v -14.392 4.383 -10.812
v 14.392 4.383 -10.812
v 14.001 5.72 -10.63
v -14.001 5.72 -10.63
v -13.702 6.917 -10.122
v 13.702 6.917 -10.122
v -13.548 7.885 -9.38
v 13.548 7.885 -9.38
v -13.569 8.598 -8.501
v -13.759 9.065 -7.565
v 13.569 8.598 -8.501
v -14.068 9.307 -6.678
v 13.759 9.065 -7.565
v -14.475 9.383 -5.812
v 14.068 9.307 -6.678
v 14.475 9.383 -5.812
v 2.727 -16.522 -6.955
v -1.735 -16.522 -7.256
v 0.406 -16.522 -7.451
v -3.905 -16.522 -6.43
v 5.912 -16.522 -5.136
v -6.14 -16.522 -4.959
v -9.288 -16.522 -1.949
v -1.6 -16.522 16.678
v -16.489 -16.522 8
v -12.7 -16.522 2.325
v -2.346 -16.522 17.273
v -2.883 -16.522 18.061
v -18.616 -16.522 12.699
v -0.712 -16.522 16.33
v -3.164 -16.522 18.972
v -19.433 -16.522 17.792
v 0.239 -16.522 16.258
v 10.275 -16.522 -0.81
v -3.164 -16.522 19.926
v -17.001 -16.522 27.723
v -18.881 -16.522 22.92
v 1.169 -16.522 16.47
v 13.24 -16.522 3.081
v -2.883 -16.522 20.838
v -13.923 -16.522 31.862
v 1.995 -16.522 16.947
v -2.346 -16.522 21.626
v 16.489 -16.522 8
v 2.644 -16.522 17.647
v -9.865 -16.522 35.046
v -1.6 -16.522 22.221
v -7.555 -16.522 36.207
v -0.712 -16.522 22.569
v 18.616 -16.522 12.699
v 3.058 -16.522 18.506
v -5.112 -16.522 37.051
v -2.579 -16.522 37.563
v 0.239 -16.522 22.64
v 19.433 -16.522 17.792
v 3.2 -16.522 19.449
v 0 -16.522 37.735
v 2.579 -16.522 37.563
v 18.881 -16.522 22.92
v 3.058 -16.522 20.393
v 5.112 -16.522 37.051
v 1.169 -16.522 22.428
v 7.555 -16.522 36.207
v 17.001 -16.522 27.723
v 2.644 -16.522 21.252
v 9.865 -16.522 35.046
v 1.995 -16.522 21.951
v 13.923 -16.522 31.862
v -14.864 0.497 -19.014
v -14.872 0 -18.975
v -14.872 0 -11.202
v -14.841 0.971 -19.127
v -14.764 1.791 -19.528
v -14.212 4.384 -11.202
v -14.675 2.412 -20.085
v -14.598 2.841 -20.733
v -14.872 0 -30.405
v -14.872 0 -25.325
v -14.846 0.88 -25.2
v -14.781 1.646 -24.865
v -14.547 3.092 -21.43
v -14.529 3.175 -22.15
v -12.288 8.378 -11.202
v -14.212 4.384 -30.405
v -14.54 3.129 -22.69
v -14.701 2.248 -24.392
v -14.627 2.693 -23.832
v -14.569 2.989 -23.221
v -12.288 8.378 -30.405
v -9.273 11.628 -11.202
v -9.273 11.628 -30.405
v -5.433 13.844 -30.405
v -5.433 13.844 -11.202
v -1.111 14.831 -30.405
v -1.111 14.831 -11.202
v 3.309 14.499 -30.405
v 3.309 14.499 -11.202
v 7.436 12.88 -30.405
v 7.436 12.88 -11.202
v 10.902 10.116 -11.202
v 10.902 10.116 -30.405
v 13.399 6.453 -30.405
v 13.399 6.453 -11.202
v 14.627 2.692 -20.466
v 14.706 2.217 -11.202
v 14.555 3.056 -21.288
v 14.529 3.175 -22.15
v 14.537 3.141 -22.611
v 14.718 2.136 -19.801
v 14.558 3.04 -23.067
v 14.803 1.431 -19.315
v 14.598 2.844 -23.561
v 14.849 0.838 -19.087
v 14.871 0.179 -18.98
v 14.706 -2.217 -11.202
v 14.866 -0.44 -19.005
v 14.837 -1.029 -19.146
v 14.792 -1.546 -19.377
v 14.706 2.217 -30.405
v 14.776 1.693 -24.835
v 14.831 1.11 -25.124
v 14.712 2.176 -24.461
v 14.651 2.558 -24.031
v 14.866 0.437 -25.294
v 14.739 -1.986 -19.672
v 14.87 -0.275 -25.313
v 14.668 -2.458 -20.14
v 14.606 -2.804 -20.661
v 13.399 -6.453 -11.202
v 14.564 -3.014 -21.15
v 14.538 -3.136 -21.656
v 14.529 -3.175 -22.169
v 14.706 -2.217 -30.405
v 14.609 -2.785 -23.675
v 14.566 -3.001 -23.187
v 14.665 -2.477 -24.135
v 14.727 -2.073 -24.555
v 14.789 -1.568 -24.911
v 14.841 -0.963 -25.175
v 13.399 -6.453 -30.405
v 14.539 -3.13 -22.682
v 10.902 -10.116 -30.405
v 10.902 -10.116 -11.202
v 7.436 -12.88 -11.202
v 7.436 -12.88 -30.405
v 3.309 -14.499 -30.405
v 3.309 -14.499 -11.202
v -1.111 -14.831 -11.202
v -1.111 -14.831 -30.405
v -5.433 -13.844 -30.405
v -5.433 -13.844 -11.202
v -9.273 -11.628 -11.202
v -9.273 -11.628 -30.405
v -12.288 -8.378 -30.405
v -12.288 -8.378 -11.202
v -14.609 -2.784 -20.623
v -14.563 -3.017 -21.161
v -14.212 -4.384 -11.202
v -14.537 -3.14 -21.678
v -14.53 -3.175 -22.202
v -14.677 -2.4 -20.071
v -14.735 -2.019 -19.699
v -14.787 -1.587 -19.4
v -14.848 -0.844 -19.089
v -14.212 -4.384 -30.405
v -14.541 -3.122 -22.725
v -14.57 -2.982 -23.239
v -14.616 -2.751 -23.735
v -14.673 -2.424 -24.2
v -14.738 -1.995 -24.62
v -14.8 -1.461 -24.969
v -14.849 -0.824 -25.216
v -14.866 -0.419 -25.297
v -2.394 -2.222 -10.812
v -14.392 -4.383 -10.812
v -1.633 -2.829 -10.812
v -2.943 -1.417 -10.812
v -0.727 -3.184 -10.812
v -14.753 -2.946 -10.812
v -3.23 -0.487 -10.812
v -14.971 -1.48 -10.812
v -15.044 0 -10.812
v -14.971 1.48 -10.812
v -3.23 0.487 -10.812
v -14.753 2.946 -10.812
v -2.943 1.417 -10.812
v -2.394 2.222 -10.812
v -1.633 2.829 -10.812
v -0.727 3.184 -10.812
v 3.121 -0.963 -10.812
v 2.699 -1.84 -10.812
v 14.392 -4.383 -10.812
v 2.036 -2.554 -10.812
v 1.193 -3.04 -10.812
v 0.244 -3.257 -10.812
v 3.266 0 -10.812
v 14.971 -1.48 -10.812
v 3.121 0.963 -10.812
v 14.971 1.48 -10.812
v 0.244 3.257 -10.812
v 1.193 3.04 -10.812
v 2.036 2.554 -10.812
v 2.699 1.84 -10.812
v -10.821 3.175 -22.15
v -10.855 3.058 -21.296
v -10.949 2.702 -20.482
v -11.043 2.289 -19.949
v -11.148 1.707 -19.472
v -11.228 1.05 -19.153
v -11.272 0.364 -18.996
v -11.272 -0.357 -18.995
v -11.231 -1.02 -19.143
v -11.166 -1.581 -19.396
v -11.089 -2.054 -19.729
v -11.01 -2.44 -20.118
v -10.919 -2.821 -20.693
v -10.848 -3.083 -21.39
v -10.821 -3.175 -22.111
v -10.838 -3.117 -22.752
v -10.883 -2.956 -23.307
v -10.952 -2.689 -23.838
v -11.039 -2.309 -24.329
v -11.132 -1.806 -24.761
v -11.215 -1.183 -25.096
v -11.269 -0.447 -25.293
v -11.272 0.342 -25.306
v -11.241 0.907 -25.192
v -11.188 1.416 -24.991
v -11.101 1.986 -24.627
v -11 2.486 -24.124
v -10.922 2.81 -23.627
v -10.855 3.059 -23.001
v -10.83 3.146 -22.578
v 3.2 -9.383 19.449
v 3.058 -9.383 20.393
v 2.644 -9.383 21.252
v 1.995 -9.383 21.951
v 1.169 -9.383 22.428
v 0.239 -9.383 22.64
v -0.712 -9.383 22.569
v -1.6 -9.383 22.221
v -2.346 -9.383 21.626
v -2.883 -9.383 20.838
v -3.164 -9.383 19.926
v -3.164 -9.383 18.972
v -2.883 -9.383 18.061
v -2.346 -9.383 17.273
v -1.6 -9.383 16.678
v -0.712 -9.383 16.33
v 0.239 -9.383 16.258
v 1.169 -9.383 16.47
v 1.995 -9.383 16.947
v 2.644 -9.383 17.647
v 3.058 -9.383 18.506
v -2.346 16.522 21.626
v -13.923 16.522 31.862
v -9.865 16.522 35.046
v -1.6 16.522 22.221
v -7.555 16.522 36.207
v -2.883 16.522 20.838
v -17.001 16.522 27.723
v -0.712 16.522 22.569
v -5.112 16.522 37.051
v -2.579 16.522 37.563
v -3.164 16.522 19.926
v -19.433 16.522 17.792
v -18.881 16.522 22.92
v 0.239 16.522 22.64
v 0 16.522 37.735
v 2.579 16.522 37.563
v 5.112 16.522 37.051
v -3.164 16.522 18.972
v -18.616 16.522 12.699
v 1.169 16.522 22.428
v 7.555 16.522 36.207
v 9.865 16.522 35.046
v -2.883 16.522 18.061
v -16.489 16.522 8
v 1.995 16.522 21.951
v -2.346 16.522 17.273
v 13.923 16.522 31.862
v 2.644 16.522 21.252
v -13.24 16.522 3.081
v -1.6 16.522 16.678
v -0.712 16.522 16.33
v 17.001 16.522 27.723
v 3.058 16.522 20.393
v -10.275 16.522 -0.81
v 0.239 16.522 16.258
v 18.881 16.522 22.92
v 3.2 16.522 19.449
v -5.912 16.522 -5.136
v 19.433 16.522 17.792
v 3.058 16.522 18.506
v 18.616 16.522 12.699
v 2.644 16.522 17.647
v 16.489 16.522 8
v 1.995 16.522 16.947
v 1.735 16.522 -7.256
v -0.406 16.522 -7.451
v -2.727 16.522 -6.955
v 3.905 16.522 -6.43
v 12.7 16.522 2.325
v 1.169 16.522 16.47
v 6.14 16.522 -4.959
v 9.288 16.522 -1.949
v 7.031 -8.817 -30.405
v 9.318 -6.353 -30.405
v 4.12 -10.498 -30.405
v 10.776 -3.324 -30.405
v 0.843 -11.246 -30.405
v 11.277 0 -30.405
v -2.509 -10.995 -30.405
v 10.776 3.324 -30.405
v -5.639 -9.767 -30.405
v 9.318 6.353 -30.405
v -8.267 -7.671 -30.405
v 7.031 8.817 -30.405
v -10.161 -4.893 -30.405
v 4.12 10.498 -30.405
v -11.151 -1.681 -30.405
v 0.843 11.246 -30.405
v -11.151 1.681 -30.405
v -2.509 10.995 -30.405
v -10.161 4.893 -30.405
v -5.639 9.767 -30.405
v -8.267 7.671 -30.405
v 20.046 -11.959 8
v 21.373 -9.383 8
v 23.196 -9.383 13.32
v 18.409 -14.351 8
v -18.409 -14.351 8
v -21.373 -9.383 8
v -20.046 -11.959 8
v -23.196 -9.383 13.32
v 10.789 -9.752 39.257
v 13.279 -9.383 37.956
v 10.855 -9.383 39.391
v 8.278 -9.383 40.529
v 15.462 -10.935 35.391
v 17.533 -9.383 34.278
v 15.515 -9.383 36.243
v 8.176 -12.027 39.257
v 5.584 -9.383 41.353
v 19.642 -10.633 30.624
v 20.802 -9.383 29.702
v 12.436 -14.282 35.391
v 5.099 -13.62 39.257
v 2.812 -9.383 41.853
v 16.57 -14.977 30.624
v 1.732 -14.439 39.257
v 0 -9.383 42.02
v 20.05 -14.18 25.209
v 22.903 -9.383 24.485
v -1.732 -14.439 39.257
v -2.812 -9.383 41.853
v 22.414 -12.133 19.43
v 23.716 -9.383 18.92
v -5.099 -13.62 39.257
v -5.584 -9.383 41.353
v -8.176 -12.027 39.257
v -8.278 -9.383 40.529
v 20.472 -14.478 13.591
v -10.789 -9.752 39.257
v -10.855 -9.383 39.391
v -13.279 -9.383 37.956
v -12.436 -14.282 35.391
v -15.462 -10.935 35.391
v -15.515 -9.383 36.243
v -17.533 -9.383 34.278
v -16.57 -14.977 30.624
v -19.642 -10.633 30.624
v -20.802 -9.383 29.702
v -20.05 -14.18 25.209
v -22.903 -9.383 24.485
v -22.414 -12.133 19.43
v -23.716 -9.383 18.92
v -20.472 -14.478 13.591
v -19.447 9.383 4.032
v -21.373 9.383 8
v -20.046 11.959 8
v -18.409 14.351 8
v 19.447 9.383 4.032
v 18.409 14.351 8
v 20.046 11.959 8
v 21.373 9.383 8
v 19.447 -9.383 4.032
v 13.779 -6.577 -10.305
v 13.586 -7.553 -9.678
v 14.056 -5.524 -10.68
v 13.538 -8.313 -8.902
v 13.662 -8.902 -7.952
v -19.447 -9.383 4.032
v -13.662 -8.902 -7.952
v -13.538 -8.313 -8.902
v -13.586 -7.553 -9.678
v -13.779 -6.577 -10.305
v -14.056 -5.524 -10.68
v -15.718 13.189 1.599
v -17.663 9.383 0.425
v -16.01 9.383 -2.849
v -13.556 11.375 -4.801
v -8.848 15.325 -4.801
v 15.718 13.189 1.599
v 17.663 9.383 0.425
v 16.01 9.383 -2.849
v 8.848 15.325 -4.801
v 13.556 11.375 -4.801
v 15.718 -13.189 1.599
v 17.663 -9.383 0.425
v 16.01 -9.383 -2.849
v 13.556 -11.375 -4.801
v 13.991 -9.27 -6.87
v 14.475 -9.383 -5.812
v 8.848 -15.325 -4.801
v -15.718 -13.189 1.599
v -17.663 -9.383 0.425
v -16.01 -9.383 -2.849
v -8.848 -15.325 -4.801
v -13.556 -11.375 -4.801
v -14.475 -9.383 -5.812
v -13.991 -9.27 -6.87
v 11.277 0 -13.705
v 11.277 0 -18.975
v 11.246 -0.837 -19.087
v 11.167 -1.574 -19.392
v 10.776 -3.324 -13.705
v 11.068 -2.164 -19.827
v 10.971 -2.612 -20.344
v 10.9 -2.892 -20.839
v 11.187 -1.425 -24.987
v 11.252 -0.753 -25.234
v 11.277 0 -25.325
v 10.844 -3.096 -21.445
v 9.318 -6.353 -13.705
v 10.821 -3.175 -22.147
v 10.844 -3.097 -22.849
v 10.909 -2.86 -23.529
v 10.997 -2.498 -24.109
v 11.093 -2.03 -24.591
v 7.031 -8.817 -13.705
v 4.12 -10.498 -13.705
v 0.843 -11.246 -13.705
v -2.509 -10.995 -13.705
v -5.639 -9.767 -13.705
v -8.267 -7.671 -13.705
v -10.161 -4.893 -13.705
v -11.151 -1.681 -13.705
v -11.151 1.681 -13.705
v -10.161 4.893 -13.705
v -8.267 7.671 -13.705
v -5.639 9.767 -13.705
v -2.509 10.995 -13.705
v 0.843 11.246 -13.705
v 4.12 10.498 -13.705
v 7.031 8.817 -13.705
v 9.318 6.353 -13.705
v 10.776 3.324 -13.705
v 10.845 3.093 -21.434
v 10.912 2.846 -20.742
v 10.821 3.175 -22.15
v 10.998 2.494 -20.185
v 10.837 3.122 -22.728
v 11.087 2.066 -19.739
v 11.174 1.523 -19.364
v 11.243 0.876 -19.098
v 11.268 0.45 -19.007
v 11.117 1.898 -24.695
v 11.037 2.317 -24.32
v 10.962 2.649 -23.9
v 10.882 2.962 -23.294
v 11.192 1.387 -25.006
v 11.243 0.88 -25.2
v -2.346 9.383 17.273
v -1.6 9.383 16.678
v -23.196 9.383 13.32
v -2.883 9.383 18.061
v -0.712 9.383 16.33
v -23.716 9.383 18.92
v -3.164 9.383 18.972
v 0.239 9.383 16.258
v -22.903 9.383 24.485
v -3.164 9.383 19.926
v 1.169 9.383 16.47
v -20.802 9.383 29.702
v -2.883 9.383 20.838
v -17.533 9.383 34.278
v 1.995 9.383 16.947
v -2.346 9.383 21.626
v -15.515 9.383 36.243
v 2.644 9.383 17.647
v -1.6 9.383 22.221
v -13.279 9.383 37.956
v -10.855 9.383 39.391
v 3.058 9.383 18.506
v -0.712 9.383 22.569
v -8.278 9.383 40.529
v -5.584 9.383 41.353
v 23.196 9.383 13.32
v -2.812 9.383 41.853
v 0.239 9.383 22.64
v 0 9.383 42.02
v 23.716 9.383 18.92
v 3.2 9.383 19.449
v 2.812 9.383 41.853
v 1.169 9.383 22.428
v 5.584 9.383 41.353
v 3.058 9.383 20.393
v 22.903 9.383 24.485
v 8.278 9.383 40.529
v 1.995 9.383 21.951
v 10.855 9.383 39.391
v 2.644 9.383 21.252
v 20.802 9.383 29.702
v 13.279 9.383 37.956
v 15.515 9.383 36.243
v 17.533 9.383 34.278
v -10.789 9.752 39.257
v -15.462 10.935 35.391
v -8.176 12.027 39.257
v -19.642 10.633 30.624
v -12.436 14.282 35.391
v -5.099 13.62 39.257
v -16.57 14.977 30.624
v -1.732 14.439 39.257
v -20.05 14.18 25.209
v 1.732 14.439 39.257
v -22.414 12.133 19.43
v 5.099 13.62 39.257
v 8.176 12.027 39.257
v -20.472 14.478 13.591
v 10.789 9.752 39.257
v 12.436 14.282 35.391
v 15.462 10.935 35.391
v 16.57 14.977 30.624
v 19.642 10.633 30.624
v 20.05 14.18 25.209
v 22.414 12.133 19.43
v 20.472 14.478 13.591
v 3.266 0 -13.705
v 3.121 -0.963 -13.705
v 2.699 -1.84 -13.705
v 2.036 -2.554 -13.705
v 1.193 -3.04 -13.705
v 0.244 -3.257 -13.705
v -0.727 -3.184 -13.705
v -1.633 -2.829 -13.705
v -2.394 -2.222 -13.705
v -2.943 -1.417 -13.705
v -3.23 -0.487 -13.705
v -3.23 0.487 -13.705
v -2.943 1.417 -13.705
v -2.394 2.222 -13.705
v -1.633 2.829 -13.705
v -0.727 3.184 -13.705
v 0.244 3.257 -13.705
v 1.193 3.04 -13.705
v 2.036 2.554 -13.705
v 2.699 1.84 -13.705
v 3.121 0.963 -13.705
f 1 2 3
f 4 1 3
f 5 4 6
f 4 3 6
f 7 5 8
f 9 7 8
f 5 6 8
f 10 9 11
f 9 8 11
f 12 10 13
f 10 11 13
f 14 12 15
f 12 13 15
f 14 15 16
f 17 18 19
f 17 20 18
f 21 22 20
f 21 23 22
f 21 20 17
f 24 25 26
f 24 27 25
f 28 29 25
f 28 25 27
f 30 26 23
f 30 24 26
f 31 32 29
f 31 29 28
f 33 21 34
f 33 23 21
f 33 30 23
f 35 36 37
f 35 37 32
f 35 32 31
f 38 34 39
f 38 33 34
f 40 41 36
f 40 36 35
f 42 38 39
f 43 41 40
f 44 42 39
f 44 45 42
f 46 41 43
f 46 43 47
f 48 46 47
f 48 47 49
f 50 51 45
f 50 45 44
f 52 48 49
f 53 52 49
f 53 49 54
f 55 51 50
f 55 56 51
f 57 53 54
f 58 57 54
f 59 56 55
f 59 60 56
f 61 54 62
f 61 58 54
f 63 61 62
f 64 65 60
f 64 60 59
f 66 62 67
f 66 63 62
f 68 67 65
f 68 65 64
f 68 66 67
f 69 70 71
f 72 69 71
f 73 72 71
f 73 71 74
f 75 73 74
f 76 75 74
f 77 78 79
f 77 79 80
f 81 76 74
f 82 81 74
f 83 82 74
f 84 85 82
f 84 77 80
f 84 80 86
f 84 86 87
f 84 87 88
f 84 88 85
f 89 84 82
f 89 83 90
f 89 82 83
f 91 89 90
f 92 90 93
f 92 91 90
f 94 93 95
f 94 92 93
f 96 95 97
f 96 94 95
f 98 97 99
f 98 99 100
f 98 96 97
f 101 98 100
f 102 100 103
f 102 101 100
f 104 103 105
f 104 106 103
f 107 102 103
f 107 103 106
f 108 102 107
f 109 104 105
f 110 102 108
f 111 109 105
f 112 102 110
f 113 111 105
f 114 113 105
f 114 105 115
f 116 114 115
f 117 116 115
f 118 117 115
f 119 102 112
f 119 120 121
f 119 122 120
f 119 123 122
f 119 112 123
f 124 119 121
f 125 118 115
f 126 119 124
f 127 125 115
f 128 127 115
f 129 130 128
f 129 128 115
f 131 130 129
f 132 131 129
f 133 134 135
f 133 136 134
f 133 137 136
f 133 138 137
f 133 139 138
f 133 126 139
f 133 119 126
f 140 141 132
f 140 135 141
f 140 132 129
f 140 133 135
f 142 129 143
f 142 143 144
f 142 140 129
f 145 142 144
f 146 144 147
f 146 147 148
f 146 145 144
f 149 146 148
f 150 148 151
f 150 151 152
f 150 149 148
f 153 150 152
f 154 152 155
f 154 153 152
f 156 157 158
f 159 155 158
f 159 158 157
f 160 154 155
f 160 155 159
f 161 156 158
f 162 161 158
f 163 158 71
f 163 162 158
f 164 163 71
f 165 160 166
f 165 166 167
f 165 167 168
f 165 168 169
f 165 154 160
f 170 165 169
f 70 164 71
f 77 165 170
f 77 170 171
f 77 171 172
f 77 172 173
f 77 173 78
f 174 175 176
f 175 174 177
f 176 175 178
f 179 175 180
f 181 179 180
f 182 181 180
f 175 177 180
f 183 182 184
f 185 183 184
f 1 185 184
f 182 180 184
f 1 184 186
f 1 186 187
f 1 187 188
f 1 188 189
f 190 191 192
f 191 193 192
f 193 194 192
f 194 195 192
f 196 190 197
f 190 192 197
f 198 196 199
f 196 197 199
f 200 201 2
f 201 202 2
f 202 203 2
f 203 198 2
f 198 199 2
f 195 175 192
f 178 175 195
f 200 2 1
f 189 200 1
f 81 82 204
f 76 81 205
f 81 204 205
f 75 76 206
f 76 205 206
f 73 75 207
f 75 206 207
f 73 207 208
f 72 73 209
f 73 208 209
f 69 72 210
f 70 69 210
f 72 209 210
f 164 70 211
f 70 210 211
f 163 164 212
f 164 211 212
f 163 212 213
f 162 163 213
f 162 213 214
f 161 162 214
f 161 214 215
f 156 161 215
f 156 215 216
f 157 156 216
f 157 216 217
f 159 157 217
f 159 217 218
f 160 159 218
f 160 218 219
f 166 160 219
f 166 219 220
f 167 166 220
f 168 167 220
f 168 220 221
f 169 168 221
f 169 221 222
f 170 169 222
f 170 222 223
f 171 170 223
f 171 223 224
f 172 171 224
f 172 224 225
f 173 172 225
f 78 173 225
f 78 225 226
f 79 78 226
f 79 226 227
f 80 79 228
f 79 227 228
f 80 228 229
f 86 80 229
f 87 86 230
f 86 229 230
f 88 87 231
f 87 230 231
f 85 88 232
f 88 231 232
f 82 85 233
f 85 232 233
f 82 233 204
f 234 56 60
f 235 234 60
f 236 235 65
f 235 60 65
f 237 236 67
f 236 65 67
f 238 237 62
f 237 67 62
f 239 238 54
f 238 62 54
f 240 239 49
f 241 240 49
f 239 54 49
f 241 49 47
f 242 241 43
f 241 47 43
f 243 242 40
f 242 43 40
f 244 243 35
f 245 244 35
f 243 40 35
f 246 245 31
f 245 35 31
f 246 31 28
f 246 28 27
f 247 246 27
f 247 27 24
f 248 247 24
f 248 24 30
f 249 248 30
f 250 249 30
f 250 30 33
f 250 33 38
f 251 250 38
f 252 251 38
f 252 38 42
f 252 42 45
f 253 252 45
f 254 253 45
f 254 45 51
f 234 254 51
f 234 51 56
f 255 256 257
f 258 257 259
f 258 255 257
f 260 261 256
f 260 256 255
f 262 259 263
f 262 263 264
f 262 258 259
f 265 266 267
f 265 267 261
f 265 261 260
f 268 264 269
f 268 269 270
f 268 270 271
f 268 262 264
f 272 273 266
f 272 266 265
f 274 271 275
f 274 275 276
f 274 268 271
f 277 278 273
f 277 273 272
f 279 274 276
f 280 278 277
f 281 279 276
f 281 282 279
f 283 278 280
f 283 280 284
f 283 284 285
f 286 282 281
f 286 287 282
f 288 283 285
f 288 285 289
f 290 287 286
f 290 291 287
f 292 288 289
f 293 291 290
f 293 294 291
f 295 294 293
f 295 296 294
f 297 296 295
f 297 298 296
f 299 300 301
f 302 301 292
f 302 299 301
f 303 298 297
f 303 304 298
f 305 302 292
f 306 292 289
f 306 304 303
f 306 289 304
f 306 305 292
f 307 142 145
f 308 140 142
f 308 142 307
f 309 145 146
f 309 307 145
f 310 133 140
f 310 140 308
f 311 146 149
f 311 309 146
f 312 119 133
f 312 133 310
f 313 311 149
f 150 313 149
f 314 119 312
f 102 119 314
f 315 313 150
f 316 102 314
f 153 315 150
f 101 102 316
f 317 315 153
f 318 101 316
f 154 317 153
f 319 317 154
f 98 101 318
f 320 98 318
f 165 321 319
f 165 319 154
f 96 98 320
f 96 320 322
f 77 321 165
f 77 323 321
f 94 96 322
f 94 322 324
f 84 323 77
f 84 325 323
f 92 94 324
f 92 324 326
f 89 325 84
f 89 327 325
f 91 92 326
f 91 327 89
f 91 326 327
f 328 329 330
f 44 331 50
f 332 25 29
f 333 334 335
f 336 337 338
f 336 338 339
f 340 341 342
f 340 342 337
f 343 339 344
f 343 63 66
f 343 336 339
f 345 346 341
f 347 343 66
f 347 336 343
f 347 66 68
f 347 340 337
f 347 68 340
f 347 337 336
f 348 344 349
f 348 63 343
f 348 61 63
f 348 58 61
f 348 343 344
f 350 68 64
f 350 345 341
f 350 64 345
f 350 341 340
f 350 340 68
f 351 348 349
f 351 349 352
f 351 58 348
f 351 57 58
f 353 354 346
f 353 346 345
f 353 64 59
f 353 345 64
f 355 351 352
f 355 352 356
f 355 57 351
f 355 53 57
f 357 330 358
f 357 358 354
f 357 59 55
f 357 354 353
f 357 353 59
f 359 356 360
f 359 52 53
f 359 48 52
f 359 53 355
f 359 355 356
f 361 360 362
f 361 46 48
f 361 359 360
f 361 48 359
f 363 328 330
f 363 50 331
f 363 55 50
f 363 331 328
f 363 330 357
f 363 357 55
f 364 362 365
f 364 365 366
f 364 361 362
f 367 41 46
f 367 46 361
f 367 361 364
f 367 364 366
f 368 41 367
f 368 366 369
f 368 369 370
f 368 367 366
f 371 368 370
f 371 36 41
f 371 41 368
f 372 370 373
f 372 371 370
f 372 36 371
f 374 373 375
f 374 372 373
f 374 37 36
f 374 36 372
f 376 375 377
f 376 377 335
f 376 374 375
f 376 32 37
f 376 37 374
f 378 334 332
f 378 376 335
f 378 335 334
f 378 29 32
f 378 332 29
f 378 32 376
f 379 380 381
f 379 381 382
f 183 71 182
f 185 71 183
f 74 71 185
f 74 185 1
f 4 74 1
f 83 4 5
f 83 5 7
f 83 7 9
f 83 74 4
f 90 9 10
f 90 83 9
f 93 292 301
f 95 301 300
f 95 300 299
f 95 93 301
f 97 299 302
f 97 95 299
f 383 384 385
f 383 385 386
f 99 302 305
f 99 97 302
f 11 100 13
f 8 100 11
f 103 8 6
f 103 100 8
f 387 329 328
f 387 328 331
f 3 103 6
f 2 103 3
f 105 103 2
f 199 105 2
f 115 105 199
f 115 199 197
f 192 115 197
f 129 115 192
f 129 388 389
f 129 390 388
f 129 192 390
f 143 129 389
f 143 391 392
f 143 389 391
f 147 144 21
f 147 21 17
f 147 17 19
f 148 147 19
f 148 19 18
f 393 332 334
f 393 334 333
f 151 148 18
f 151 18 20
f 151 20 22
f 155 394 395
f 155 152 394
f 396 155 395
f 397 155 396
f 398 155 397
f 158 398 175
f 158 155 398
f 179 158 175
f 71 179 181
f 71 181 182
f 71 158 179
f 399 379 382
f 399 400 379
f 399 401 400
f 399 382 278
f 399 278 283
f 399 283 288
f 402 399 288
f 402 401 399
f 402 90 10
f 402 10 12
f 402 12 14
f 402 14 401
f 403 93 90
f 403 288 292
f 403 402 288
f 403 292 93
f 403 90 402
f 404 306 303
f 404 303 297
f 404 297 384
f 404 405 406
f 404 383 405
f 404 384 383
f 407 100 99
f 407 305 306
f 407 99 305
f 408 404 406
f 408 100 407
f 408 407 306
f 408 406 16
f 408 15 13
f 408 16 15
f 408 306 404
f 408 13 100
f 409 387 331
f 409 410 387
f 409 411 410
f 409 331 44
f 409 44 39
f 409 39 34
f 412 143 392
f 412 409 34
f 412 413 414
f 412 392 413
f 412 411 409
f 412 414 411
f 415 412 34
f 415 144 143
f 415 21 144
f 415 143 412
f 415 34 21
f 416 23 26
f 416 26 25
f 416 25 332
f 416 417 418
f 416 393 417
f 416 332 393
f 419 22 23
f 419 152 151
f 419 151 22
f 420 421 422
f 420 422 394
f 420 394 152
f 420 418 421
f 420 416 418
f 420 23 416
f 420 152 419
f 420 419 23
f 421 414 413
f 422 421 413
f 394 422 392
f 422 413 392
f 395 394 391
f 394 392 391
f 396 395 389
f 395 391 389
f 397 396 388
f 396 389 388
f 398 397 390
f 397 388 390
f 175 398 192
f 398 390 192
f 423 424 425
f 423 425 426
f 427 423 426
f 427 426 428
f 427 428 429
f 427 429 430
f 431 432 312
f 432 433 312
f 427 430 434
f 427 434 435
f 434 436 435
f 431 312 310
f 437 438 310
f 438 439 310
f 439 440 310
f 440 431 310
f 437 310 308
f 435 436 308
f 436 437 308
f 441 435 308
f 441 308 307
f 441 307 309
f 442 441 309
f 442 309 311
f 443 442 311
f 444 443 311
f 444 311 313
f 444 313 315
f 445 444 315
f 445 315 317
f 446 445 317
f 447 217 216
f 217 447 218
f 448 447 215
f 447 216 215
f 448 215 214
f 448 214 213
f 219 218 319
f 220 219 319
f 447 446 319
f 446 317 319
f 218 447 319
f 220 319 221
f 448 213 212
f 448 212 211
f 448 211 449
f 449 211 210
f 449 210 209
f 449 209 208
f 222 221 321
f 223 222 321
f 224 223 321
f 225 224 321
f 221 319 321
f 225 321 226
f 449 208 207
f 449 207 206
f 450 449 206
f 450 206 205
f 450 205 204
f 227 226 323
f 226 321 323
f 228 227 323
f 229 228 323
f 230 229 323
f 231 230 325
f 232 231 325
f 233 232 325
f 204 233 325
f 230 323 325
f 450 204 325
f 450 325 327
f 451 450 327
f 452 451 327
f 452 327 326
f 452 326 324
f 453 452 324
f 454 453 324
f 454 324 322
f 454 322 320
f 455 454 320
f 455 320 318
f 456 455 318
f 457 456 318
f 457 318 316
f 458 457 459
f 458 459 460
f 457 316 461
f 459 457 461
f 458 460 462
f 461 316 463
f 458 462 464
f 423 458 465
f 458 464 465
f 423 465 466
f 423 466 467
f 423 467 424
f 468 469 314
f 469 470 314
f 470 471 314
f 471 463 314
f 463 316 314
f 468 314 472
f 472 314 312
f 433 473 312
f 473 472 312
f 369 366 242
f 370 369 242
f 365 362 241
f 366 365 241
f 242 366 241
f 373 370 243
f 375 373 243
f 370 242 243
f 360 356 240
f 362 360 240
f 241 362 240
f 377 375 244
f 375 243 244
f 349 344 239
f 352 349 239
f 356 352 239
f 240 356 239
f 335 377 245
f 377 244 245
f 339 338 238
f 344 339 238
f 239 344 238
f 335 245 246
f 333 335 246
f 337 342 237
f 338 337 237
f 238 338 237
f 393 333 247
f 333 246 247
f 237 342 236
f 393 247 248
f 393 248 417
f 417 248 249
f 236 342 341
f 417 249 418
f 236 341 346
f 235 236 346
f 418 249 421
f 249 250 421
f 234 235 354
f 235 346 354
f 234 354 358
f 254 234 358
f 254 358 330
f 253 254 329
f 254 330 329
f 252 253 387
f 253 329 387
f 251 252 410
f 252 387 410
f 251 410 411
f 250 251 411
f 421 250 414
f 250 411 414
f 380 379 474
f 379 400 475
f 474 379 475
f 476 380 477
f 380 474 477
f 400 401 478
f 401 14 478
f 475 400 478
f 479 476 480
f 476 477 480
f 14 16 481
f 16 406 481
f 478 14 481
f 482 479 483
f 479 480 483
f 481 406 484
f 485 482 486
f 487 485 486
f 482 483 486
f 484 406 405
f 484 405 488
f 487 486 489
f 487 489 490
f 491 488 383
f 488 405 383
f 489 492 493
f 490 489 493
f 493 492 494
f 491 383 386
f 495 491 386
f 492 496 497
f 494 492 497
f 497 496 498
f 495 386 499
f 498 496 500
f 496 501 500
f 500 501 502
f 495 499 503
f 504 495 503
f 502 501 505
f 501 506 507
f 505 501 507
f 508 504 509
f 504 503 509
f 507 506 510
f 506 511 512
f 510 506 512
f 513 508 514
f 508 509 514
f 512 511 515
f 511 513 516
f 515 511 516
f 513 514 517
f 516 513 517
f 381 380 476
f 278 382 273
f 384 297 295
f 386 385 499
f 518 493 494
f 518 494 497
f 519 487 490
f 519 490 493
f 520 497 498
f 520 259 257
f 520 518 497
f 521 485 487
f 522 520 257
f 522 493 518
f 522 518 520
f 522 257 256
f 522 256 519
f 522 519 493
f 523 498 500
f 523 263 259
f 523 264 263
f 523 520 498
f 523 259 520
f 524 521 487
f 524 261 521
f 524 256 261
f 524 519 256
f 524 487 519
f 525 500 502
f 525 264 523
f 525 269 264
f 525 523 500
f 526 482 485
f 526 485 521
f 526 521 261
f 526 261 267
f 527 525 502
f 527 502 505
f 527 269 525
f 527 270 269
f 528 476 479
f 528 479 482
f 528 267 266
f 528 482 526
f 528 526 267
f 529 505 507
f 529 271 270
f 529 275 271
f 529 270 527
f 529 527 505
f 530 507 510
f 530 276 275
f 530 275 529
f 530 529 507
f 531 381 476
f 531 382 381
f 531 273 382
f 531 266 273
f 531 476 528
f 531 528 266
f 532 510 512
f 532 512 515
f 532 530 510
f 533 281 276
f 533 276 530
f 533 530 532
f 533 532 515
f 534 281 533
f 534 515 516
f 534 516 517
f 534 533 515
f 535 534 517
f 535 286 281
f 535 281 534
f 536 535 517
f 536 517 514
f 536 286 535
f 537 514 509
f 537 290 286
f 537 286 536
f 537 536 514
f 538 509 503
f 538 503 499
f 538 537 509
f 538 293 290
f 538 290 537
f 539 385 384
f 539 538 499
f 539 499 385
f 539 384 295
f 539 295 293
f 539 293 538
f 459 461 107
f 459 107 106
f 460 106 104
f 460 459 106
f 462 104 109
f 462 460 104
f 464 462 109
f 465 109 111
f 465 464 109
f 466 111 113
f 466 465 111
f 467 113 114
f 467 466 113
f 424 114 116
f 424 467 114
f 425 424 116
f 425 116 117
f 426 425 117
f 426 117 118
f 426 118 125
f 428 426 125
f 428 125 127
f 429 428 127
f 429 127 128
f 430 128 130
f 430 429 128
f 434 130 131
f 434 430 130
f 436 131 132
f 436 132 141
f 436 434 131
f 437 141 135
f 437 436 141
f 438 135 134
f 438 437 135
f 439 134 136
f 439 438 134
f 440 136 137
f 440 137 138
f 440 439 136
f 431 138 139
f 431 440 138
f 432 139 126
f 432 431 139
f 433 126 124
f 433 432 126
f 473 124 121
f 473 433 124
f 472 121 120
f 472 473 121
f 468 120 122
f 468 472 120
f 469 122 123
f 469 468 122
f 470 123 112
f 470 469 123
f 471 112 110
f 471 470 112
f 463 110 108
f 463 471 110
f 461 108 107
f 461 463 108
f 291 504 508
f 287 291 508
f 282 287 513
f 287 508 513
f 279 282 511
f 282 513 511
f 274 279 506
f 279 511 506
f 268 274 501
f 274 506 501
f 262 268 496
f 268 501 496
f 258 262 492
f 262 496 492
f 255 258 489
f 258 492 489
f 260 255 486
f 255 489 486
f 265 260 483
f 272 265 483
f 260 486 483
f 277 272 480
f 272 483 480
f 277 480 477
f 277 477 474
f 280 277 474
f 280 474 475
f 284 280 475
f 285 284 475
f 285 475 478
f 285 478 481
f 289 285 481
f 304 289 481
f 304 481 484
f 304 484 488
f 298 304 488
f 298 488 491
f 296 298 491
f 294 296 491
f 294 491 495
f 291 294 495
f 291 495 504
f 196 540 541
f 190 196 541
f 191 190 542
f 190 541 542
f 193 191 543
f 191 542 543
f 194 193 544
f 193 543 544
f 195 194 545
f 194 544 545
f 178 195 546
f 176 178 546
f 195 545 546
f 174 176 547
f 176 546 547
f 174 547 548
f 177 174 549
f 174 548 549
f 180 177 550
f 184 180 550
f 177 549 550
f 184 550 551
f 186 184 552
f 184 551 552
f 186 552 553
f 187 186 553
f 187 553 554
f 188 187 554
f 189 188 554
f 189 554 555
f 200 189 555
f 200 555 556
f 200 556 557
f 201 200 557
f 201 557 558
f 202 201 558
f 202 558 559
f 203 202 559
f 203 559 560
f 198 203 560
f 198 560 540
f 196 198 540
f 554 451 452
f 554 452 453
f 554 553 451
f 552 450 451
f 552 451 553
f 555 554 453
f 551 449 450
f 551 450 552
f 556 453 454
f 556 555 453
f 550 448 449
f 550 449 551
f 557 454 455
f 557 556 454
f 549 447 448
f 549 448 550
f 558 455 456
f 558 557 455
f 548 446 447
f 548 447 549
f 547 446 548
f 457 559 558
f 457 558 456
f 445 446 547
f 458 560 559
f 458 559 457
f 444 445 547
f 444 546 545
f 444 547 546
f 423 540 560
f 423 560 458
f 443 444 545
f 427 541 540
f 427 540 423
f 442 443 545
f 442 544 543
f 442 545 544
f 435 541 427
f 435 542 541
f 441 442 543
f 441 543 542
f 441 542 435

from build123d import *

# Parameters (mm, degrees)
F2_W           = 73.3678117394
F2_H           = 19.5953426883
F3_DEPTH       = 47.4
F5_DEPTH       = 37.1
F6_R           = 11.2774131236
F7_DEPTH       = 16.7
F8_R           = 3.2
F9_DEPTH       = 36.8
F10_R          = 3.2661219018
F11_DEPTH      = 25
F12_R          = 3.175
F13_DEPTH      = 25
F13_DEPTH_BACK = 25


with BuildPart() as f1:
    # F0 (on Front) → F1 (revolve)
    with BuildSketch(Plane.XZ):
        with BuildLine():
            ThreePointArc((-23.3421701398, 7.9997662245), (-19.8064798686, 2.2157757205), (-14.8723184541, -2.4328480523))
            Line((-14.8723184541, -2.4328480523), (-14.8723184541, 8.0005478124))
            Line((-14.8723184541, 8.0005478124), (0, 8.0005478124))
            Line((0, 8.0005478124), (0, 43.8080292363))
            ThreePointArc((0, 43.8080292363), (-21.3722285148, 32.2277381458), (-23.3421701398, 7.9997662245))
        make_face()
        with BuildLine():
            ThreePointArc((-14.8723184541, -2.4328480523), (-7.8113091337, -5.9909309274), (0, -7.2161884465))
            Line((0, -7.2161884465), (0, 8.0005478124))
            Line((0, 8.0005478124), (-14.8723184541, 8.0005478124))
            Line((-14.8723184541, 8.0005478124), (-14.8723184541, -2.4328480523))
        make_face()
        with BuildLine():
            Line((-14.8723184541, -11.2020362965), (-14.8723184541, -30.4046204054))
            Line((-14.8723184541, -30.4046204054), (0, -30.4046204054))
            Line((0, -30.4046204054), (0, -7.2161884465))
            ThreePointArc((0, -7.2161884465), (-7.8113091337, -5.9909309274), (-14.8723184541, -2.4328480523))
            Line((-14.8723184541, -2.4328480523), (-14.8723184541, -11.2020362965))
        make_face()
        with BuildLine():
            Line((-23.3421701398, 7.9997662245), (-14.8723184541, -11.2020362965))
            Line((-14.8723184541, -11.2020362965), (-14.8723184541, -2.4328480523))
            ThreePointArc((-14.8723184541, -2.4328480523), (-19.8064798686, 2.2157757205), (-23.3421701398, 7.9997662245))
        make_face()
    revolve(axis=Axis((0, 0, 4.5623818878), (0, 0, -1)))

    # F2 (on Top) → F3 (cut, symmetric)
    with BuildSketch(Plane.XY):
        with Locations((-2.2661872208, 26.3196849264)):
            Rectangle(F2_W, F2_H)
        with Locations((-2.2661872208, -26.3196849264)):
            Rectangle(F2_W, F2_H)
    extrude(amount=F3_DEPTH, both=True, mode=Mode.SUBTRACT)

    # F4 (on Right) → F5 (cut, symmetric)
    with BuildSketch(Plane.YZ):
        with BuildLine():
            Line((9.3827452511, -5.8119617216), (9.3827452511, 45.4891547561))
            Line((9.3827452511, 45.4891547561), (0, 45.4891547561))
            Line((0, 45.4891547561), (0, -10.8119617216))
            Line((0, -10.8119617216), (4.3827452511, -10.8119617216))
            ThreePointArc((4.3827452511, -10.8119617216), (7.918279157, -9.3474956276), (9.3827452511, -5.8119617216))
        make_face()
        with BuildLine():
            Line((0, -10.8119617216), (0, 45.4891547561))
            Line((0, 45.4891547561), (-9.3827452511, 45.4891547561))
            Line((-9.3827452511, 45.4891547561), (-9.3827452511, -5.8119617216))
            ThreePointArc((-9.3827452511, -5.8119617216), (-7.918279157, -9.3474956276), (-4.3827452511, -10.8119617216))
            Line((-4.3827452511, -10.8119617216), (0, -10.8119617216))
        make_face()
    extrude(amount=F5_DEPTH, both=True, mode=Mode.SUBTRACT)

    # F6 (on face) → F7 (cut)
    with BuildSketch(Plane(origin=(0, 0, -30.4046204054), x_dir=(1, 0, 0), z_dir=(0, 0, -1))):
        Circle(F6_R)
    extrude(amount=-F7_DEPTH, mode=Mode.SUBTRACT)

    # F8 (on face) + F3_face1 (on face) → F9 (cut)
    with BuildSketch(Plane.XZ.offset(16.5220135823)):
        with Locations((0, 19.4492916284)):
            Circle(F8_R)
    with BuildSketch(Plane(origin=(0, 16.5220135823, 16.4645974536), x_dir=(-1, 0, 0), z_dir=(0, 1, 0))):
        with BuildLine():
            add(Edge.make_bspline(
                [(-16.488783279, -8.4648312291), (0, -34.870804714), (16.488783279, -8.4648312291)],
                knots=[-0.8799506859, -0.8799506859, -0.8799506859, 0.8799506859, 0.8799506859, 0.8799506859], degree=2, weights=[1, 1.4127920924, 1]))
            ThreePointArc((16.488783279, -8.4648312291), (0, 21.2707356053), (-16.488783279, -8.4648312291))
        make_face()
    extrude(amount=-F9_DEPTH, dir=(0, -1, 0), mode=Mode.SUBTRACT)

    # F10 (on face) → F11 (cut)
    with BuildSketch(Plane(origin=(0, 0, -13.7046204054), x_dir=(1, 0, 0), z_dir=(0, 0, -1))):
        Circle(F10_R)
    extrude(amount=-F11_DEPTH, mode=Mode.SUBTRACT)

    # F12 (on Right) → F13 (cut, two sides)
    with BuildSketch(Plane.YZ) as f13_sk:
        with Locations((0, -22.1496204054)):
            Circle(F12_R)
    extrude(amount=-F13_DEPTH, mode=Mode.SUBTRACT)
    extrude(f13_sk.sketch, amount=F13_DEPTH_BACK, mode=Mode.SUBTRACT)


solid = f1.part
